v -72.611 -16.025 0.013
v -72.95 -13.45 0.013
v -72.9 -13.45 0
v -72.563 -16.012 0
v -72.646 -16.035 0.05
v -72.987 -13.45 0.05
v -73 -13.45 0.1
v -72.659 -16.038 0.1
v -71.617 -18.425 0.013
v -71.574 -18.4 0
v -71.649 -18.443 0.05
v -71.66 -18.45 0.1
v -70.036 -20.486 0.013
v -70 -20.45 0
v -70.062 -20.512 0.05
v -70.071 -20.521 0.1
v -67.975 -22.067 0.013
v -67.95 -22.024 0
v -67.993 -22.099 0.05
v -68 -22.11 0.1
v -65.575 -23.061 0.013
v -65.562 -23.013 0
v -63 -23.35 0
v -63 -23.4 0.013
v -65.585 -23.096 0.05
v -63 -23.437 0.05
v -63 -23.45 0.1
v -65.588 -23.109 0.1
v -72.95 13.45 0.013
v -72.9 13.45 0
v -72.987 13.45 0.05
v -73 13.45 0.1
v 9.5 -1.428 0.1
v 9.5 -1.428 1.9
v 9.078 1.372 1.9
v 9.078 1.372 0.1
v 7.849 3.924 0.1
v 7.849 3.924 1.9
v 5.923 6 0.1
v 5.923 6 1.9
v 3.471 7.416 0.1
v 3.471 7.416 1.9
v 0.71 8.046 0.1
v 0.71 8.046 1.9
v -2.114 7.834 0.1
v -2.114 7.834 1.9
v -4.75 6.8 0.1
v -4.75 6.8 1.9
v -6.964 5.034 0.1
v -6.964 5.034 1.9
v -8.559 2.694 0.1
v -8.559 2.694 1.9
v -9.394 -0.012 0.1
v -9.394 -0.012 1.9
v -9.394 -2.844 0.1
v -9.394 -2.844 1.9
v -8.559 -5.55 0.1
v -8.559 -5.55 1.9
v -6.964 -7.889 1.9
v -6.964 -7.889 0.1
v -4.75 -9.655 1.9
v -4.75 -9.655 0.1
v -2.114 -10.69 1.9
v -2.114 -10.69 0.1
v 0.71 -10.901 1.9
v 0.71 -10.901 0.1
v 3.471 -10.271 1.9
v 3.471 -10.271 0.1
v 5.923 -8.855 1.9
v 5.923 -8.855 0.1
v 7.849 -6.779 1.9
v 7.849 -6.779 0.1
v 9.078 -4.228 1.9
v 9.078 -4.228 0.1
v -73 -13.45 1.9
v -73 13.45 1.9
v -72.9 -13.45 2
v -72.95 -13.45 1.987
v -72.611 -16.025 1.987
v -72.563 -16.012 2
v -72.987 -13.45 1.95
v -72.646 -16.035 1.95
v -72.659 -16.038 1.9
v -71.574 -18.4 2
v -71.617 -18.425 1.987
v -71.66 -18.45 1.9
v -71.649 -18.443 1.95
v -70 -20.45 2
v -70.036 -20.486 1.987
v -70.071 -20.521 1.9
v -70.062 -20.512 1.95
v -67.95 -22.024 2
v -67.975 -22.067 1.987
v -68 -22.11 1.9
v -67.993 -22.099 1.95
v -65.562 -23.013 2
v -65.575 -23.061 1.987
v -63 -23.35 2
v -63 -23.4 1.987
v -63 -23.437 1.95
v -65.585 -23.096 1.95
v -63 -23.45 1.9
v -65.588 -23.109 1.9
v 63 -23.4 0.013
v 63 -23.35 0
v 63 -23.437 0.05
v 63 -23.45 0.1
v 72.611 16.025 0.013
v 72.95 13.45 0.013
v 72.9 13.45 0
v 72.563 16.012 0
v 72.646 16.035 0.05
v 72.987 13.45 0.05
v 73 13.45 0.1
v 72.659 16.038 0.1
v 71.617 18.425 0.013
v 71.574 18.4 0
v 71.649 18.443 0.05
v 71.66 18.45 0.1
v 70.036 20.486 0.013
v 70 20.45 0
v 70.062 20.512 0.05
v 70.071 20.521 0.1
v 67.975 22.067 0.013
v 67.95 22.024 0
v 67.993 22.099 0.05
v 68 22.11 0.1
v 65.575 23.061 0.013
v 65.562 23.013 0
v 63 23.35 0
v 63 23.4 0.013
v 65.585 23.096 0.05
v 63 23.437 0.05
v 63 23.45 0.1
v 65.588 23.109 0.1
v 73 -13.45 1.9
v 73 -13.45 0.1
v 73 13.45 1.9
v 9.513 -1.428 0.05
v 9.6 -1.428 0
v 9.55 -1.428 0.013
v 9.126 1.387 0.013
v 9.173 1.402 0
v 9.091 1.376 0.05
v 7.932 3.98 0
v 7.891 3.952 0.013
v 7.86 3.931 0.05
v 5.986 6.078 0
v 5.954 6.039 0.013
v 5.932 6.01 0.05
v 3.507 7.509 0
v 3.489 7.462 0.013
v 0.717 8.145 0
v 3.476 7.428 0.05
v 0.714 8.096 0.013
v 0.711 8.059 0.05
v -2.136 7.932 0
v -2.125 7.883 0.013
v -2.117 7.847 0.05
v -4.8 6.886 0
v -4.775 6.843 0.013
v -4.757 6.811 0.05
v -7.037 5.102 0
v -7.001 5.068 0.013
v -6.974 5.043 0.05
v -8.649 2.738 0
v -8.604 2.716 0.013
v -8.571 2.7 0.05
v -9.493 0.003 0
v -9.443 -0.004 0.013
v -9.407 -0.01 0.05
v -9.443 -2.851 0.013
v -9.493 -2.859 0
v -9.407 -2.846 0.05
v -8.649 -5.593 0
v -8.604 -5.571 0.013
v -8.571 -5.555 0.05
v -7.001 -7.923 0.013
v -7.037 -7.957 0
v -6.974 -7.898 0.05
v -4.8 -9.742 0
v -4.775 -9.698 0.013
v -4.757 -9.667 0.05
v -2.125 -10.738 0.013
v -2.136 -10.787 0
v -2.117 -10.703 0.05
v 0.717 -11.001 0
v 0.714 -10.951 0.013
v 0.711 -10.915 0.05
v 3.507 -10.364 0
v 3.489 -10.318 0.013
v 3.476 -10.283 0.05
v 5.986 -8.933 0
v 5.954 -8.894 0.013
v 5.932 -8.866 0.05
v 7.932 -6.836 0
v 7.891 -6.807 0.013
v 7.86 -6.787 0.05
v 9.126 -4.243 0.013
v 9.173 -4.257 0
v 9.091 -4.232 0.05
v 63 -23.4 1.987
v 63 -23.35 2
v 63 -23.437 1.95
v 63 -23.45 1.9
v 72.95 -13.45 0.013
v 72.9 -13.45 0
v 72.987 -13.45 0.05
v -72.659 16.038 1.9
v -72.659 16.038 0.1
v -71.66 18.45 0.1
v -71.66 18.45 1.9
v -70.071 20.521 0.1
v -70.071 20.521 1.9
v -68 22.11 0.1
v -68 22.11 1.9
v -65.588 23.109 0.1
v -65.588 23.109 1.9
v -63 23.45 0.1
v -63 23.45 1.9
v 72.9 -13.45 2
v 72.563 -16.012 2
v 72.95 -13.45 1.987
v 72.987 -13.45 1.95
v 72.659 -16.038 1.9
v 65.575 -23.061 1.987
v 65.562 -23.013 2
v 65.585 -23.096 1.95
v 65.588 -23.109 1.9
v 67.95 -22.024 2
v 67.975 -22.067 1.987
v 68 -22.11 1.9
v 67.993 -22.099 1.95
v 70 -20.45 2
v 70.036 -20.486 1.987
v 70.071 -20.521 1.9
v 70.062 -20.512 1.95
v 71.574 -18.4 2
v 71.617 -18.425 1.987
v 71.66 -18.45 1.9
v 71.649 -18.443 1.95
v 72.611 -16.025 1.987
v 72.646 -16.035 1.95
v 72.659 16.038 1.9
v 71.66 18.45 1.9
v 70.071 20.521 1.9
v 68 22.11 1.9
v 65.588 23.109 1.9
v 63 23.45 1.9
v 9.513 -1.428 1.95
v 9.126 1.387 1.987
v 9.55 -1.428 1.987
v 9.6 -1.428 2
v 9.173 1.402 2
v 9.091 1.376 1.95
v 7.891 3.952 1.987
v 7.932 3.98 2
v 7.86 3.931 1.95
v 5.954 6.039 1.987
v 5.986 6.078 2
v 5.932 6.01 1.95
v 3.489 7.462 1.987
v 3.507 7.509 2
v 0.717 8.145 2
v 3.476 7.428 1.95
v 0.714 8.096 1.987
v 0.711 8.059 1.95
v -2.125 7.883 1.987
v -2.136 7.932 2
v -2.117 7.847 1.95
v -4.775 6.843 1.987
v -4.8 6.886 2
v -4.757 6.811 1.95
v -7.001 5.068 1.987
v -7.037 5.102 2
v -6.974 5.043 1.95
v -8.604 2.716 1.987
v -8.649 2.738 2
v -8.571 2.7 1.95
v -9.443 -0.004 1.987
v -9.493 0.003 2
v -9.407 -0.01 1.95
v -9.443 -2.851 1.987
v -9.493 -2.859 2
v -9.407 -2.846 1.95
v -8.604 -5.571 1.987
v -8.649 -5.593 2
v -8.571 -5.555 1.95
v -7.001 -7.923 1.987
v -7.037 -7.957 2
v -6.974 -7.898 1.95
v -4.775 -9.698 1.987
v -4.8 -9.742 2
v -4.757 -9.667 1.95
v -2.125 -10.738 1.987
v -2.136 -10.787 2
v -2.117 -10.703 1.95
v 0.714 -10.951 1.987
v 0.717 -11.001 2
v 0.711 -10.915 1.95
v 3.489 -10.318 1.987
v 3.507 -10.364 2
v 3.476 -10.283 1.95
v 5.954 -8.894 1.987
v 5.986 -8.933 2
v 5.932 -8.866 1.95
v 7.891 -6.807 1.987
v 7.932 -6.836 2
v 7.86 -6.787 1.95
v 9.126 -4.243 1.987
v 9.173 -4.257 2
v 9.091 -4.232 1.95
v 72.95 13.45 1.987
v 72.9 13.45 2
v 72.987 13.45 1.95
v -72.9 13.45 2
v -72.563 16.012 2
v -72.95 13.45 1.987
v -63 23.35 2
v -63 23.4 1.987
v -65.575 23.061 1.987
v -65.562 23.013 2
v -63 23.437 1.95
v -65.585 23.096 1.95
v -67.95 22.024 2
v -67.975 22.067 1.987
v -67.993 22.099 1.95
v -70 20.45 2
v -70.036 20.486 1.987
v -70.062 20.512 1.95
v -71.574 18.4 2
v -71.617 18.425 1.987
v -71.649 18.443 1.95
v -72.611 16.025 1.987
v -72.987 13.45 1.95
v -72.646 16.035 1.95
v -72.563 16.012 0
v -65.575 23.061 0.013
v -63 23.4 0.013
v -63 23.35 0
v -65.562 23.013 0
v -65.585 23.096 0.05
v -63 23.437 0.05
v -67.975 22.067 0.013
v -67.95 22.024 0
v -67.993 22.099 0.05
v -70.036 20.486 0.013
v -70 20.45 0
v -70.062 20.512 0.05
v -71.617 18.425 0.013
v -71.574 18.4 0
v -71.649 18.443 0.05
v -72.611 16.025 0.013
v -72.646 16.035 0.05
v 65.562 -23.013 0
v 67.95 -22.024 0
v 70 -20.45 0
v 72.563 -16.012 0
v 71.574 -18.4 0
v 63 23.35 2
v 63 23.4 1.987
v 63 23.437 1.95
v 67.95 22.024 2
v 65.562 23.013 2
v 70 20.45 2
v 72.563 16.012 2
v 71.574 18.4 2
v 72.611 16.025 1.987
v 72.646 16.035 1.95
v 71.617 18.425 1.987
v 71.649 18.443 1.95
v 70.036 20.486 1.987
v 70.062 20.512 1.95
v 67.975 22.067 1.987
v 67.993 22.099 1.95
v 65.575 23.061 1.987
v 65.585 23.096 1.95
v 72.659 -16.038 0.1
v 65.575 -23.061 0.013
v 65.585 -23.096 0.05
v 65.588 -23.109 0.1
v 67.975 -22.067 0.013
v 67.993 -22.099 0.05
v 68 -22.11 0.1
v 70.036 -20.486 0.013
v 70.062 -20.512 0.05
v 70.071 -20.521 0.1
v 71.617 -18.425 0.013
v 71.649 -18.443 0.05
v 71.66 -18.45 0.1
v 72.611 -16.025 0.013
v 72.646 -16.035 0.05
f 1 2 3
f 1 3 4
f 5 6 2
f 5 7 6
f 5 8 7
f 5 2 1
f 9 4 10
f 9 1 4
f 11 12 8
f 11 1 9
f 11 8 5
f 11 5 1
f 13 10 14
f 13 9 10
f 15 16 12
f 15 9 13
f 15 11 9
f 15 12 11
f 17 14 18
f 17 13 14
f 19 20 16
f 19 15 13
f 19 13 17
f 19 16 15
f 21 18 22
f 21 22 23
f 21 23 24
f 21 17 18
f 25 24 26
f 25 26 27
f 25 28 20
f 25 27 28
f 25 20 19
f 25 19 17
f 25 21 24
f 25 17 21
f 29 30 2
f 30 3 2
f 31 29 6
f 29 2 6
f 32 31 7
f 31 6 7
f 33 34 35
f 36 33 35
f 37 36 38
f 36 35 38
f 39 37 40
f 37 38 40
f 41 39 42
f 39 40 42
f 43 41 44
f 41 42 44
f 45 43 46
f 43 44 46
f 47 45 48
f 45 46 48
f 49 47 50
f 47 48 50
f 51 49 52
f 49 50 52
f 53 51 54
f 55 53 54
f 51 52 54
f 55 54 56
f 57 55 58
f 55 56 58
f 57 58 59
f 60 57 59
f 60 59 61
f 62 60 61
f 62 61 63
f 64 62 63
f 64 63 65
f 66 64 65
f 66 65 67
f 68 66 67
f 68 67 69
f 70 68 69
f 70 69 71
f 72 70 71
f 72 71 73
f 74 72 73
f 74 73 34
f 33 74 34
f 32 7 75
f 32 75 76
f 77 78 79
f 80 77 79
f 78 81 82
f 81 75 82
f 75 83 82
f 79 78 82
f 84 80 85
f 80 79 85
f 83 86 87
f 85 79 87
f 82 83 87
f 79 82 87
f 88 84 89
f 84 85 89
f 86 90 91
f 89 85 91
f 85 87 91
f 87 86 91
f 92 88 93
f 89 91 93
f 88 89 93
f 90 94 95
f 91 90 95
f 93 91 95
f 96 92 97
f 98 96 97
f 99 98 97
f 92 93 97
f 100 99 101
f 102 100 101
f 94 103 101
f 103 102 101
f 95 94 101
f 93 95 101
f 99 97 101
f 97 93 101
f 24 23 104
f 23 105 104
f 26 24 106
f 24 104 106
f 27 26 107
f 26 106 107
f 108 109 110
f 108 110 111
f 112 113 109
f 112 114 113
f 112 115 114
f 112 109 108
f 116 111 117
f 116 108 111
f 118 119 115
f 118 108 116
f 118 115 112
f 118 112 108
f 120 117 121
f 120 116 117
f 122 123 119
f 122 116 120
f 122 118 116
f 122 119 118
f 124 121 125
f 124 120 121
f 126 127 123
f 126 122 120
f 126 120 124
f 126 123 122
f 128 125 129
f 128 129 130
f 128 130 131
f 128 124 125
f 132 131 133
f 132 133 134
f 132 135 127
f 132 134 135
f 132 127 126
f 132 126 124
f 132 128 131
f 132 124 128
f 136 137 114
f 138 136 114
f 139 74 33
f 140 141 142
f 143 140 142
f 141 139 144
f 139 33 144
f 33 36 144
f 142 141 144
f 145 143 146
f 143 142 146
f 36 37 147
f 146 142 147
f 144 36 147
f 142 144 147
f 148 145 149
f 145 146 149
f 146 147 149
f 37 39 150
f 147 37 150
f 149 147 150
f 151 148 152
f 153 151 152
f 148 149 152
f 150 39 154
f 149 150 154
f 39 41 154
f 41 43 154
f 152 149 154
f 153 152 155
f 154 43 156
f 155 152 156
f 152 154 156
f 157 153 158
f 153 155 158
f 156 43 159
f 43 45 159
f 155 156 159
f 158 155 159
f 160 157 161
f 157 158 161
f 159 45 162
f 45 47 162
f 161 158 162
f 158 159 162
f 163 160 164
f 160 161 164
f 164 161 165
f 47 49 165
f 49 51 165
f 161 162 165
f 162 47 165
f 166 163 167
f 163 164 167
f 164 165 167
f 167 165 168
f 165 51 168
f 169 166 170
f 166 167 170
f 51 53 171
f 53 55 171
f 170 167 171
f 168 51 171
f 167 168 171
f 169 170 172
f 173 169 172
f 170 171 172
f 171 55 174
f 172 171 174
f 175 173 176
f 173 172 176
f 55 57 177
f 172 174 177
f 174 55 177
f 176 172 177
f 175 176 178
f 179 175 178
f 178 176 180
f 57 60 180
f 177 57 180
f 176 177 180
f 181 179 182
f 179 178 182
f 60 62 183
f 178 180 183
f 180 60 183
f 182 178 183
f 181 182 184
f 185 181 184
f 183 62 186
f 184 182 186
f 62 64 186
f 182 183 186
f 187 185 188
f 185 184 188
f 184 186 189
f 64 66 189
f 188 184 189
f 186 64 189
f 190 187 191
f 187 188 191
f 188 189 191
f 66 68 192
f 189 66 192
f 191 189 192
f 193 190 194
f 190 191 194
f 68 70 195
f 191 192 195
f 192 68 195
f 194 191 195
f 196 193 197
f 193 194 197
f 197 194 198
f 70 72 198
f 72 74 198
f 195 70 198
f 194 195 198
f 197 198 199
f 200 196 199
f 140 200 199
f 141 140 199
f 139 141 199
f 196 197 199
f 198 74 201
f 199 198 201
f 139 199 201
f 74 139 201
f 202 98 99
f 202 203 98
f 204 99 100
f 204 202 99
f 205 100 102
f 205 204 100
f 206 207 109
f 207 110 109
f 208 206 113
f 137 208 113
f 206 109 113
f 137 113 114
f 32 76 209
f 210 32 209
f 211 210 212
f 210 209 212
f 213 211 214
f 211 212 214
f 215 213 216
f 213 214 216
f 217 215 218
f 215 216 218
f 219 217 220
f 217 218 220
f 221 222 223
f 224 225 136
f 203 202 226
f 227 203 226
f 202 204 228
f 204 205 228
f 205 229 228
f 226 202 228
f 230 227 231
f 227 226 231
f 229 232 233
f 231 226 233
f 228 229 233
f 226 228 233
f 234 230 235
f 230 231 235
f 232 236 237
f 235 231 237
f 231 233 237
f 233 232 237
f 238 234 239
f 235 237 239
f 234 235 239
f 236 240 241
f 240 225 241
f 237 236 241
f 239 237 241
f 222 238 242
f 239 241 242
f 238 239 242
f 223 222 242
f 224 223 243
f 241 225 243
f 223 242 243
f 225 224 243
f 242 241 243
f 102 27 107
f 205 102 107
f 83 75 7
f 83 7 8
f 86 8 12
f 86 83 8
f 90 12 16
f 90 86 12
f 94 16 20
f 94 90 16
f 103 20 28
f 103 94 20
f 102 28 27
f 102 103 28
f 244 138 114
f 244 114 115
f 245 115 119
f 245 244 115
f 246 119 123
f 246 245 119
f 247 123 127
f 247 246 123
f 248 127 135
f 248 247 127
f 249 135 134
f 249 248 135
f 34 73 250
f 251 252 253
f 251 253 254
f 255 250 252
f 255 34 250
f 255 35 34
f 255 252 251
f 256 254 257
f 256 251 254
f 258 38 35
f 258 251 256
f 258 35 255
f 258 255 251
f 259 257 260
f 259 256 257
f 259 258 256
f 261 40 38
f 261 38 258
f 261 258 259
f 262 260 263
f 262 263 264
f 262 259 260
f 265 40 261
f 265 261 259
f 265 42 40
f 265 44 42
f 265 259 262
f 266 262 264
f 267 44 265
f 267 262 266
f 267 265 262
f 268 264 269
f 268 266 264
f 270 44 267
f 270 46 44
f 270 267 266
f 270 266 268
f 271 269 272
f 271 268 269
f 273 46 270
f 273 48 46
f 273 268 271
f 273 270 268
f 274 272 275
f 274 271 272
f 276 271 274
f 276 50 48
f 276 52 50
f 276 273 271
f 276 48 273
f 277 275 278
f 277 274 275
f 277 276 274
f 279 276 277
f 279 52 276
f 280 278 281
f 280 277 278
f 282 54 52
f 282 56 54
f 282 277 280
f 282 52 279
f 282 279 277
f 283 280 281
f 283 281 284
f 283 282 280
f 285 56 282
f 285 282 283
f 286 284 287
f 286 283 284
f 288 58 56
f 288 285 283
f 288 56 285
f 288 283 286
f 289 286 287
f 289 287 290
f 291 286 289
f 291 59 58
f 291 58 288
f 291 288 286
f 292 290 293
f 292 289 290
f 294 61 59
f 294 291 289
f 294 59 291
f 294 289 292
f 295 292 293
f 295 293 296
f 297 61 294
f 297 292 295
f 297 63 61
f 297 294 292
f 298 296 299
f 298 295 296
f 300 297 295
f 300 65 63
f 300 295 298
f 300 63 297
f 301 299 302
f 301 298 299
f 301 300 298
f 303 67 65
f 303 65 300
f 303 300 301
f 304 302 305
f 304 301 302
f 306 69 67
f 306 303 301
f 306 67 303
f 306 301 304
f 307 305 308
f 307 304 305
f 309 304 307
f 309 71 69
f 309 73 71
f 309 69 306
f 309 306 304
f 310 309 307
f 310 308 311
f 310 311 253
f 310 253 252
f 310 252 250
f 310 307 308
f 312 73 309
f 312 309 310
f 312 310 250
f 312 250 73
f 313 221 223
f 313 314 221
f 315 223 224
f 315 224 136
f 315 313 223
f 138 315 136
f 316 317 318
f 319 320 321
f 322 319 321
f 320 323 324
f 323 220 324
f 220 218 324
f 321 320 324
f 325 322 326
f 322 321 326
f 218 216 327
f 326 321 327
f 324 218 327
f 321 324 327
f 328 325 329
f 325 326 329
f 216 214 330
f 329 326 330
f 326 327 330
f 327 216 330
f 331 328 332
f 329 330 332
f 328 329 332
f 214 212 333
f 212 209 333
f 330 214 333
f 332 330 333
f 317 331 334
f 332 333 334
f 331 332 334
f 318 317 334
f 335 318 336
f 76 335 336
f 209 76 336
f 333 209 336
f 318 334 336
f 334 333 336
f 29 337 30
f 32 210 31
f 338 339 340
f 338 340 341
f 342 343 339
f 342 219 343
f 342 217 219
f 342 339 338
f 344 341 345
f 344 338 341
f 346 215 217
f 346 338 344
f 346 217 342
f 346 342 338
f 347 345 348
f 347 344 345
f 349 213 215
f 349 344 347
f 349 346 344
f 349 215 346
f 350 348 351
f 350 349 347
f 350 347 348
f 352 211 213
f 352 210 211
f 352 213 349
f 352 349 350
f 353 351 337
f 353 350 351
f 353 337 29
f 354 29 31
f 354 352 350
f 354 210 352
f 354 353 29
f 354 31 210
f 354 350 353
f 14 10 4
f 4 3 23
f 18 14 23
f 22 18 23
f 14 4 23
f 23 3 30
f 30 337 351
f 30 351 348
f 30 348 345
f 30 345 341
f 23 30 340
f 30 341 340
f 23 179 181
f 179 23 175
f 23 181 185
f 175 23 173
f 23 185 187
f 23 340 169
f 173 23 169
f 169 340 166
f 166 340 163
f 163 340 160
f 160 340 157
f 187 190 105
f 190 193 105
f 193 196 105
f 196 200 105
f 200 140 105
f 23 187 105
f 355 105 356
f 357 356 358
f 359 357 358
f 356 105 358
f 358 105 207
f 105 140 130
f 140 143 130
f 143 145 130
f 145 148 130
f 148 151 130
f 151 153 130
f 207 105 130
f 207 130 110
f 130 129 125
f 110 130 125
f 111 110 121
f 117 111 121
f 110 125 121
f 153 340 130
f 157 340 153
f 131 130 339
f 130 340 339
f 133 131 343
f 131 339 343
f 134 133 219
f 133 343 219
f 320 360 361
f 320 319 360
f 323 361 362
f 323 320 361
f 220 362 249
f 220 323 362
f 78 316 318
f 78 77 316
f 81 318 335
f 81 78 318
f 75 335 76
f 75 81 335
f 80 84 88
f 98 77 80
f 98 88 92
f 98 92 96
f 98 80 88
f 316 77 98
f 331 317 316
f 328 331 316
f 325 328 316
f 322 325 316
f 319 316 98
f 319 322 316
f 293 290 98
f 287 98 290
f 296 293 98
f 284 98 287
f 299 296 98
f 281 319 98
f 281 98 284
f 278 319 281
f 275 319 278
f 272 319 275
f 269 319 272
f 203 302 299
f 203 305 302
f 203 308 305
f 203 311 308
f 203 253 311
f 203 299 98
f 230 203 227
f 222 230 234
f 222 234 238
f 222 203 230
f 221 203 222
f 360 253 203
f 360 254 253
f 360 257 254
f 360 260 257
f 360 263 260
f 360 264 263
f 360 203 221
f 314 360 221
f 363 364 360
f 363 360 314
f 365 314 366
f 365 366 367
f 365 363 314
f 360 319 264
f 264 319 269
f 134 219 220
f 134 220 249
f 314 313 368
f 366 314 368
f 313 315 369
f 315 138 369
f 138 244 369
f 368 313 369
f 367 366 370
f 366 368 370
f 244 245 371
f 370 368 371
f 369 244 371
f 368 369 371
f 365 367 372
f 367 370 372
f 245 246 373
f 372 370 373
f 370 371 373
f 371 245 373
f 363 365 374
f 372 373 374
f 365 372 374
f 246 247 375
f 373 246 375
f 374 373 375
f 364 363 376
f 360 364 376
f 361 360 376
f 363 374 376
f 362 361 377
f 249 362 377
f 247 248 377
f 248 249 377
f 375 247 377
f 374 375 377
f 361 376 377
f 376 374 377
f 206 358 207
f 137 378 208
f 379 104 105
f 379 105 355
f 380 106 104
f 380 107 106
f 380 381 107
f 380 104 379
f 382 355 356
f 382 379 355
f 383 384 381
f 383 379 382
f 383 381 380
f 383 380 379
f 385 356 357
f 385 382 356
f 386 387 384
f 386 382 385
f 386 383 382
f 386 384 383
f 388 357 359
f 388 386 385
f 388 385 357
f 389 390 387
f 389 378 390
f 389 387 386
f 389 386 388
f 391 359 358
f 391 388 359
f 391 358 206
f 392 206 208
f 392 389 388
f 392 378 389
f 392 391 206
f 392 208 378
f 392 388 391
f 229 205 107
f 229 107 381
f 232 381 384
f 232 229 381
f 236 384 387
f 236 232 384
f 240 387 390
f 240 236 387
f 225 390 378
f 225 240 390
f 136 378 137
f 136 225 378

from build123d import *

# Parameters (mm, degrees)
F0_W     = 146
F0_H     = 46.9
F1_DEPTH = 2
F2_R     = 10
F3_R     = 9.5
F4_DEPTH = 25
F5_R     = 0.1


with BuildPart() as f1:
    # F0 (on Top) → F1 (new body)
    with BuildSketch(Plane.XY):
        Rectangle(F0_W, F0_H)
    extrude(amount=F1_DEPTH)

    # F2
    f2_edges = [f1.edges().sort_by_distance(p)[0] for p in [
        (73, -23.45, 1),
        (73, 23.45, 1),
        (-73, -23.45, 1),
        (-73, 23.45, 1),
    ]]
    fillet(f2_edges, radius=F2_R)

    # F3 (on face) → F4 (cut)
    with BuildSketch(Plane.XY.offset(2)):
        with Locations((0, -1.4277177065)):
            Circle(F3_R)
    extrude(amount=-F4_DEPTH, mode=Mode.SUBTRACT)

    # F5
    f5_edges = [f1.edges().sort_by_distance(p)[0] for p in [
        (73, 0, 2),
        (70.071068, -20.521068, 2),
        (70.071068, 20.521068, 2),
        (0, -23.45, 2),
        (0, 23.45, 2),
        (-70.071068, -20.521068, 2),
        (-70.071068, 20.521068, 2),
        (-73, 0, 2),
        (-9.5, -1.427718, 2),
        (73, 0, 0),
        (70.071068, -20.521068, 0),
        (70.071068, 20.521068, 0),
        (0, -23.45, 0),
        (0, 23.45, 0),
        (-70.071068, -20.521068, 0),
        (-70.071068, 20.521068, 0),
        (-73, 0, 0),
        (-9.5, -1.427718, 0),
    ]]
    fillet(f5_edges, radius=F5_R)


solid = f1.part
